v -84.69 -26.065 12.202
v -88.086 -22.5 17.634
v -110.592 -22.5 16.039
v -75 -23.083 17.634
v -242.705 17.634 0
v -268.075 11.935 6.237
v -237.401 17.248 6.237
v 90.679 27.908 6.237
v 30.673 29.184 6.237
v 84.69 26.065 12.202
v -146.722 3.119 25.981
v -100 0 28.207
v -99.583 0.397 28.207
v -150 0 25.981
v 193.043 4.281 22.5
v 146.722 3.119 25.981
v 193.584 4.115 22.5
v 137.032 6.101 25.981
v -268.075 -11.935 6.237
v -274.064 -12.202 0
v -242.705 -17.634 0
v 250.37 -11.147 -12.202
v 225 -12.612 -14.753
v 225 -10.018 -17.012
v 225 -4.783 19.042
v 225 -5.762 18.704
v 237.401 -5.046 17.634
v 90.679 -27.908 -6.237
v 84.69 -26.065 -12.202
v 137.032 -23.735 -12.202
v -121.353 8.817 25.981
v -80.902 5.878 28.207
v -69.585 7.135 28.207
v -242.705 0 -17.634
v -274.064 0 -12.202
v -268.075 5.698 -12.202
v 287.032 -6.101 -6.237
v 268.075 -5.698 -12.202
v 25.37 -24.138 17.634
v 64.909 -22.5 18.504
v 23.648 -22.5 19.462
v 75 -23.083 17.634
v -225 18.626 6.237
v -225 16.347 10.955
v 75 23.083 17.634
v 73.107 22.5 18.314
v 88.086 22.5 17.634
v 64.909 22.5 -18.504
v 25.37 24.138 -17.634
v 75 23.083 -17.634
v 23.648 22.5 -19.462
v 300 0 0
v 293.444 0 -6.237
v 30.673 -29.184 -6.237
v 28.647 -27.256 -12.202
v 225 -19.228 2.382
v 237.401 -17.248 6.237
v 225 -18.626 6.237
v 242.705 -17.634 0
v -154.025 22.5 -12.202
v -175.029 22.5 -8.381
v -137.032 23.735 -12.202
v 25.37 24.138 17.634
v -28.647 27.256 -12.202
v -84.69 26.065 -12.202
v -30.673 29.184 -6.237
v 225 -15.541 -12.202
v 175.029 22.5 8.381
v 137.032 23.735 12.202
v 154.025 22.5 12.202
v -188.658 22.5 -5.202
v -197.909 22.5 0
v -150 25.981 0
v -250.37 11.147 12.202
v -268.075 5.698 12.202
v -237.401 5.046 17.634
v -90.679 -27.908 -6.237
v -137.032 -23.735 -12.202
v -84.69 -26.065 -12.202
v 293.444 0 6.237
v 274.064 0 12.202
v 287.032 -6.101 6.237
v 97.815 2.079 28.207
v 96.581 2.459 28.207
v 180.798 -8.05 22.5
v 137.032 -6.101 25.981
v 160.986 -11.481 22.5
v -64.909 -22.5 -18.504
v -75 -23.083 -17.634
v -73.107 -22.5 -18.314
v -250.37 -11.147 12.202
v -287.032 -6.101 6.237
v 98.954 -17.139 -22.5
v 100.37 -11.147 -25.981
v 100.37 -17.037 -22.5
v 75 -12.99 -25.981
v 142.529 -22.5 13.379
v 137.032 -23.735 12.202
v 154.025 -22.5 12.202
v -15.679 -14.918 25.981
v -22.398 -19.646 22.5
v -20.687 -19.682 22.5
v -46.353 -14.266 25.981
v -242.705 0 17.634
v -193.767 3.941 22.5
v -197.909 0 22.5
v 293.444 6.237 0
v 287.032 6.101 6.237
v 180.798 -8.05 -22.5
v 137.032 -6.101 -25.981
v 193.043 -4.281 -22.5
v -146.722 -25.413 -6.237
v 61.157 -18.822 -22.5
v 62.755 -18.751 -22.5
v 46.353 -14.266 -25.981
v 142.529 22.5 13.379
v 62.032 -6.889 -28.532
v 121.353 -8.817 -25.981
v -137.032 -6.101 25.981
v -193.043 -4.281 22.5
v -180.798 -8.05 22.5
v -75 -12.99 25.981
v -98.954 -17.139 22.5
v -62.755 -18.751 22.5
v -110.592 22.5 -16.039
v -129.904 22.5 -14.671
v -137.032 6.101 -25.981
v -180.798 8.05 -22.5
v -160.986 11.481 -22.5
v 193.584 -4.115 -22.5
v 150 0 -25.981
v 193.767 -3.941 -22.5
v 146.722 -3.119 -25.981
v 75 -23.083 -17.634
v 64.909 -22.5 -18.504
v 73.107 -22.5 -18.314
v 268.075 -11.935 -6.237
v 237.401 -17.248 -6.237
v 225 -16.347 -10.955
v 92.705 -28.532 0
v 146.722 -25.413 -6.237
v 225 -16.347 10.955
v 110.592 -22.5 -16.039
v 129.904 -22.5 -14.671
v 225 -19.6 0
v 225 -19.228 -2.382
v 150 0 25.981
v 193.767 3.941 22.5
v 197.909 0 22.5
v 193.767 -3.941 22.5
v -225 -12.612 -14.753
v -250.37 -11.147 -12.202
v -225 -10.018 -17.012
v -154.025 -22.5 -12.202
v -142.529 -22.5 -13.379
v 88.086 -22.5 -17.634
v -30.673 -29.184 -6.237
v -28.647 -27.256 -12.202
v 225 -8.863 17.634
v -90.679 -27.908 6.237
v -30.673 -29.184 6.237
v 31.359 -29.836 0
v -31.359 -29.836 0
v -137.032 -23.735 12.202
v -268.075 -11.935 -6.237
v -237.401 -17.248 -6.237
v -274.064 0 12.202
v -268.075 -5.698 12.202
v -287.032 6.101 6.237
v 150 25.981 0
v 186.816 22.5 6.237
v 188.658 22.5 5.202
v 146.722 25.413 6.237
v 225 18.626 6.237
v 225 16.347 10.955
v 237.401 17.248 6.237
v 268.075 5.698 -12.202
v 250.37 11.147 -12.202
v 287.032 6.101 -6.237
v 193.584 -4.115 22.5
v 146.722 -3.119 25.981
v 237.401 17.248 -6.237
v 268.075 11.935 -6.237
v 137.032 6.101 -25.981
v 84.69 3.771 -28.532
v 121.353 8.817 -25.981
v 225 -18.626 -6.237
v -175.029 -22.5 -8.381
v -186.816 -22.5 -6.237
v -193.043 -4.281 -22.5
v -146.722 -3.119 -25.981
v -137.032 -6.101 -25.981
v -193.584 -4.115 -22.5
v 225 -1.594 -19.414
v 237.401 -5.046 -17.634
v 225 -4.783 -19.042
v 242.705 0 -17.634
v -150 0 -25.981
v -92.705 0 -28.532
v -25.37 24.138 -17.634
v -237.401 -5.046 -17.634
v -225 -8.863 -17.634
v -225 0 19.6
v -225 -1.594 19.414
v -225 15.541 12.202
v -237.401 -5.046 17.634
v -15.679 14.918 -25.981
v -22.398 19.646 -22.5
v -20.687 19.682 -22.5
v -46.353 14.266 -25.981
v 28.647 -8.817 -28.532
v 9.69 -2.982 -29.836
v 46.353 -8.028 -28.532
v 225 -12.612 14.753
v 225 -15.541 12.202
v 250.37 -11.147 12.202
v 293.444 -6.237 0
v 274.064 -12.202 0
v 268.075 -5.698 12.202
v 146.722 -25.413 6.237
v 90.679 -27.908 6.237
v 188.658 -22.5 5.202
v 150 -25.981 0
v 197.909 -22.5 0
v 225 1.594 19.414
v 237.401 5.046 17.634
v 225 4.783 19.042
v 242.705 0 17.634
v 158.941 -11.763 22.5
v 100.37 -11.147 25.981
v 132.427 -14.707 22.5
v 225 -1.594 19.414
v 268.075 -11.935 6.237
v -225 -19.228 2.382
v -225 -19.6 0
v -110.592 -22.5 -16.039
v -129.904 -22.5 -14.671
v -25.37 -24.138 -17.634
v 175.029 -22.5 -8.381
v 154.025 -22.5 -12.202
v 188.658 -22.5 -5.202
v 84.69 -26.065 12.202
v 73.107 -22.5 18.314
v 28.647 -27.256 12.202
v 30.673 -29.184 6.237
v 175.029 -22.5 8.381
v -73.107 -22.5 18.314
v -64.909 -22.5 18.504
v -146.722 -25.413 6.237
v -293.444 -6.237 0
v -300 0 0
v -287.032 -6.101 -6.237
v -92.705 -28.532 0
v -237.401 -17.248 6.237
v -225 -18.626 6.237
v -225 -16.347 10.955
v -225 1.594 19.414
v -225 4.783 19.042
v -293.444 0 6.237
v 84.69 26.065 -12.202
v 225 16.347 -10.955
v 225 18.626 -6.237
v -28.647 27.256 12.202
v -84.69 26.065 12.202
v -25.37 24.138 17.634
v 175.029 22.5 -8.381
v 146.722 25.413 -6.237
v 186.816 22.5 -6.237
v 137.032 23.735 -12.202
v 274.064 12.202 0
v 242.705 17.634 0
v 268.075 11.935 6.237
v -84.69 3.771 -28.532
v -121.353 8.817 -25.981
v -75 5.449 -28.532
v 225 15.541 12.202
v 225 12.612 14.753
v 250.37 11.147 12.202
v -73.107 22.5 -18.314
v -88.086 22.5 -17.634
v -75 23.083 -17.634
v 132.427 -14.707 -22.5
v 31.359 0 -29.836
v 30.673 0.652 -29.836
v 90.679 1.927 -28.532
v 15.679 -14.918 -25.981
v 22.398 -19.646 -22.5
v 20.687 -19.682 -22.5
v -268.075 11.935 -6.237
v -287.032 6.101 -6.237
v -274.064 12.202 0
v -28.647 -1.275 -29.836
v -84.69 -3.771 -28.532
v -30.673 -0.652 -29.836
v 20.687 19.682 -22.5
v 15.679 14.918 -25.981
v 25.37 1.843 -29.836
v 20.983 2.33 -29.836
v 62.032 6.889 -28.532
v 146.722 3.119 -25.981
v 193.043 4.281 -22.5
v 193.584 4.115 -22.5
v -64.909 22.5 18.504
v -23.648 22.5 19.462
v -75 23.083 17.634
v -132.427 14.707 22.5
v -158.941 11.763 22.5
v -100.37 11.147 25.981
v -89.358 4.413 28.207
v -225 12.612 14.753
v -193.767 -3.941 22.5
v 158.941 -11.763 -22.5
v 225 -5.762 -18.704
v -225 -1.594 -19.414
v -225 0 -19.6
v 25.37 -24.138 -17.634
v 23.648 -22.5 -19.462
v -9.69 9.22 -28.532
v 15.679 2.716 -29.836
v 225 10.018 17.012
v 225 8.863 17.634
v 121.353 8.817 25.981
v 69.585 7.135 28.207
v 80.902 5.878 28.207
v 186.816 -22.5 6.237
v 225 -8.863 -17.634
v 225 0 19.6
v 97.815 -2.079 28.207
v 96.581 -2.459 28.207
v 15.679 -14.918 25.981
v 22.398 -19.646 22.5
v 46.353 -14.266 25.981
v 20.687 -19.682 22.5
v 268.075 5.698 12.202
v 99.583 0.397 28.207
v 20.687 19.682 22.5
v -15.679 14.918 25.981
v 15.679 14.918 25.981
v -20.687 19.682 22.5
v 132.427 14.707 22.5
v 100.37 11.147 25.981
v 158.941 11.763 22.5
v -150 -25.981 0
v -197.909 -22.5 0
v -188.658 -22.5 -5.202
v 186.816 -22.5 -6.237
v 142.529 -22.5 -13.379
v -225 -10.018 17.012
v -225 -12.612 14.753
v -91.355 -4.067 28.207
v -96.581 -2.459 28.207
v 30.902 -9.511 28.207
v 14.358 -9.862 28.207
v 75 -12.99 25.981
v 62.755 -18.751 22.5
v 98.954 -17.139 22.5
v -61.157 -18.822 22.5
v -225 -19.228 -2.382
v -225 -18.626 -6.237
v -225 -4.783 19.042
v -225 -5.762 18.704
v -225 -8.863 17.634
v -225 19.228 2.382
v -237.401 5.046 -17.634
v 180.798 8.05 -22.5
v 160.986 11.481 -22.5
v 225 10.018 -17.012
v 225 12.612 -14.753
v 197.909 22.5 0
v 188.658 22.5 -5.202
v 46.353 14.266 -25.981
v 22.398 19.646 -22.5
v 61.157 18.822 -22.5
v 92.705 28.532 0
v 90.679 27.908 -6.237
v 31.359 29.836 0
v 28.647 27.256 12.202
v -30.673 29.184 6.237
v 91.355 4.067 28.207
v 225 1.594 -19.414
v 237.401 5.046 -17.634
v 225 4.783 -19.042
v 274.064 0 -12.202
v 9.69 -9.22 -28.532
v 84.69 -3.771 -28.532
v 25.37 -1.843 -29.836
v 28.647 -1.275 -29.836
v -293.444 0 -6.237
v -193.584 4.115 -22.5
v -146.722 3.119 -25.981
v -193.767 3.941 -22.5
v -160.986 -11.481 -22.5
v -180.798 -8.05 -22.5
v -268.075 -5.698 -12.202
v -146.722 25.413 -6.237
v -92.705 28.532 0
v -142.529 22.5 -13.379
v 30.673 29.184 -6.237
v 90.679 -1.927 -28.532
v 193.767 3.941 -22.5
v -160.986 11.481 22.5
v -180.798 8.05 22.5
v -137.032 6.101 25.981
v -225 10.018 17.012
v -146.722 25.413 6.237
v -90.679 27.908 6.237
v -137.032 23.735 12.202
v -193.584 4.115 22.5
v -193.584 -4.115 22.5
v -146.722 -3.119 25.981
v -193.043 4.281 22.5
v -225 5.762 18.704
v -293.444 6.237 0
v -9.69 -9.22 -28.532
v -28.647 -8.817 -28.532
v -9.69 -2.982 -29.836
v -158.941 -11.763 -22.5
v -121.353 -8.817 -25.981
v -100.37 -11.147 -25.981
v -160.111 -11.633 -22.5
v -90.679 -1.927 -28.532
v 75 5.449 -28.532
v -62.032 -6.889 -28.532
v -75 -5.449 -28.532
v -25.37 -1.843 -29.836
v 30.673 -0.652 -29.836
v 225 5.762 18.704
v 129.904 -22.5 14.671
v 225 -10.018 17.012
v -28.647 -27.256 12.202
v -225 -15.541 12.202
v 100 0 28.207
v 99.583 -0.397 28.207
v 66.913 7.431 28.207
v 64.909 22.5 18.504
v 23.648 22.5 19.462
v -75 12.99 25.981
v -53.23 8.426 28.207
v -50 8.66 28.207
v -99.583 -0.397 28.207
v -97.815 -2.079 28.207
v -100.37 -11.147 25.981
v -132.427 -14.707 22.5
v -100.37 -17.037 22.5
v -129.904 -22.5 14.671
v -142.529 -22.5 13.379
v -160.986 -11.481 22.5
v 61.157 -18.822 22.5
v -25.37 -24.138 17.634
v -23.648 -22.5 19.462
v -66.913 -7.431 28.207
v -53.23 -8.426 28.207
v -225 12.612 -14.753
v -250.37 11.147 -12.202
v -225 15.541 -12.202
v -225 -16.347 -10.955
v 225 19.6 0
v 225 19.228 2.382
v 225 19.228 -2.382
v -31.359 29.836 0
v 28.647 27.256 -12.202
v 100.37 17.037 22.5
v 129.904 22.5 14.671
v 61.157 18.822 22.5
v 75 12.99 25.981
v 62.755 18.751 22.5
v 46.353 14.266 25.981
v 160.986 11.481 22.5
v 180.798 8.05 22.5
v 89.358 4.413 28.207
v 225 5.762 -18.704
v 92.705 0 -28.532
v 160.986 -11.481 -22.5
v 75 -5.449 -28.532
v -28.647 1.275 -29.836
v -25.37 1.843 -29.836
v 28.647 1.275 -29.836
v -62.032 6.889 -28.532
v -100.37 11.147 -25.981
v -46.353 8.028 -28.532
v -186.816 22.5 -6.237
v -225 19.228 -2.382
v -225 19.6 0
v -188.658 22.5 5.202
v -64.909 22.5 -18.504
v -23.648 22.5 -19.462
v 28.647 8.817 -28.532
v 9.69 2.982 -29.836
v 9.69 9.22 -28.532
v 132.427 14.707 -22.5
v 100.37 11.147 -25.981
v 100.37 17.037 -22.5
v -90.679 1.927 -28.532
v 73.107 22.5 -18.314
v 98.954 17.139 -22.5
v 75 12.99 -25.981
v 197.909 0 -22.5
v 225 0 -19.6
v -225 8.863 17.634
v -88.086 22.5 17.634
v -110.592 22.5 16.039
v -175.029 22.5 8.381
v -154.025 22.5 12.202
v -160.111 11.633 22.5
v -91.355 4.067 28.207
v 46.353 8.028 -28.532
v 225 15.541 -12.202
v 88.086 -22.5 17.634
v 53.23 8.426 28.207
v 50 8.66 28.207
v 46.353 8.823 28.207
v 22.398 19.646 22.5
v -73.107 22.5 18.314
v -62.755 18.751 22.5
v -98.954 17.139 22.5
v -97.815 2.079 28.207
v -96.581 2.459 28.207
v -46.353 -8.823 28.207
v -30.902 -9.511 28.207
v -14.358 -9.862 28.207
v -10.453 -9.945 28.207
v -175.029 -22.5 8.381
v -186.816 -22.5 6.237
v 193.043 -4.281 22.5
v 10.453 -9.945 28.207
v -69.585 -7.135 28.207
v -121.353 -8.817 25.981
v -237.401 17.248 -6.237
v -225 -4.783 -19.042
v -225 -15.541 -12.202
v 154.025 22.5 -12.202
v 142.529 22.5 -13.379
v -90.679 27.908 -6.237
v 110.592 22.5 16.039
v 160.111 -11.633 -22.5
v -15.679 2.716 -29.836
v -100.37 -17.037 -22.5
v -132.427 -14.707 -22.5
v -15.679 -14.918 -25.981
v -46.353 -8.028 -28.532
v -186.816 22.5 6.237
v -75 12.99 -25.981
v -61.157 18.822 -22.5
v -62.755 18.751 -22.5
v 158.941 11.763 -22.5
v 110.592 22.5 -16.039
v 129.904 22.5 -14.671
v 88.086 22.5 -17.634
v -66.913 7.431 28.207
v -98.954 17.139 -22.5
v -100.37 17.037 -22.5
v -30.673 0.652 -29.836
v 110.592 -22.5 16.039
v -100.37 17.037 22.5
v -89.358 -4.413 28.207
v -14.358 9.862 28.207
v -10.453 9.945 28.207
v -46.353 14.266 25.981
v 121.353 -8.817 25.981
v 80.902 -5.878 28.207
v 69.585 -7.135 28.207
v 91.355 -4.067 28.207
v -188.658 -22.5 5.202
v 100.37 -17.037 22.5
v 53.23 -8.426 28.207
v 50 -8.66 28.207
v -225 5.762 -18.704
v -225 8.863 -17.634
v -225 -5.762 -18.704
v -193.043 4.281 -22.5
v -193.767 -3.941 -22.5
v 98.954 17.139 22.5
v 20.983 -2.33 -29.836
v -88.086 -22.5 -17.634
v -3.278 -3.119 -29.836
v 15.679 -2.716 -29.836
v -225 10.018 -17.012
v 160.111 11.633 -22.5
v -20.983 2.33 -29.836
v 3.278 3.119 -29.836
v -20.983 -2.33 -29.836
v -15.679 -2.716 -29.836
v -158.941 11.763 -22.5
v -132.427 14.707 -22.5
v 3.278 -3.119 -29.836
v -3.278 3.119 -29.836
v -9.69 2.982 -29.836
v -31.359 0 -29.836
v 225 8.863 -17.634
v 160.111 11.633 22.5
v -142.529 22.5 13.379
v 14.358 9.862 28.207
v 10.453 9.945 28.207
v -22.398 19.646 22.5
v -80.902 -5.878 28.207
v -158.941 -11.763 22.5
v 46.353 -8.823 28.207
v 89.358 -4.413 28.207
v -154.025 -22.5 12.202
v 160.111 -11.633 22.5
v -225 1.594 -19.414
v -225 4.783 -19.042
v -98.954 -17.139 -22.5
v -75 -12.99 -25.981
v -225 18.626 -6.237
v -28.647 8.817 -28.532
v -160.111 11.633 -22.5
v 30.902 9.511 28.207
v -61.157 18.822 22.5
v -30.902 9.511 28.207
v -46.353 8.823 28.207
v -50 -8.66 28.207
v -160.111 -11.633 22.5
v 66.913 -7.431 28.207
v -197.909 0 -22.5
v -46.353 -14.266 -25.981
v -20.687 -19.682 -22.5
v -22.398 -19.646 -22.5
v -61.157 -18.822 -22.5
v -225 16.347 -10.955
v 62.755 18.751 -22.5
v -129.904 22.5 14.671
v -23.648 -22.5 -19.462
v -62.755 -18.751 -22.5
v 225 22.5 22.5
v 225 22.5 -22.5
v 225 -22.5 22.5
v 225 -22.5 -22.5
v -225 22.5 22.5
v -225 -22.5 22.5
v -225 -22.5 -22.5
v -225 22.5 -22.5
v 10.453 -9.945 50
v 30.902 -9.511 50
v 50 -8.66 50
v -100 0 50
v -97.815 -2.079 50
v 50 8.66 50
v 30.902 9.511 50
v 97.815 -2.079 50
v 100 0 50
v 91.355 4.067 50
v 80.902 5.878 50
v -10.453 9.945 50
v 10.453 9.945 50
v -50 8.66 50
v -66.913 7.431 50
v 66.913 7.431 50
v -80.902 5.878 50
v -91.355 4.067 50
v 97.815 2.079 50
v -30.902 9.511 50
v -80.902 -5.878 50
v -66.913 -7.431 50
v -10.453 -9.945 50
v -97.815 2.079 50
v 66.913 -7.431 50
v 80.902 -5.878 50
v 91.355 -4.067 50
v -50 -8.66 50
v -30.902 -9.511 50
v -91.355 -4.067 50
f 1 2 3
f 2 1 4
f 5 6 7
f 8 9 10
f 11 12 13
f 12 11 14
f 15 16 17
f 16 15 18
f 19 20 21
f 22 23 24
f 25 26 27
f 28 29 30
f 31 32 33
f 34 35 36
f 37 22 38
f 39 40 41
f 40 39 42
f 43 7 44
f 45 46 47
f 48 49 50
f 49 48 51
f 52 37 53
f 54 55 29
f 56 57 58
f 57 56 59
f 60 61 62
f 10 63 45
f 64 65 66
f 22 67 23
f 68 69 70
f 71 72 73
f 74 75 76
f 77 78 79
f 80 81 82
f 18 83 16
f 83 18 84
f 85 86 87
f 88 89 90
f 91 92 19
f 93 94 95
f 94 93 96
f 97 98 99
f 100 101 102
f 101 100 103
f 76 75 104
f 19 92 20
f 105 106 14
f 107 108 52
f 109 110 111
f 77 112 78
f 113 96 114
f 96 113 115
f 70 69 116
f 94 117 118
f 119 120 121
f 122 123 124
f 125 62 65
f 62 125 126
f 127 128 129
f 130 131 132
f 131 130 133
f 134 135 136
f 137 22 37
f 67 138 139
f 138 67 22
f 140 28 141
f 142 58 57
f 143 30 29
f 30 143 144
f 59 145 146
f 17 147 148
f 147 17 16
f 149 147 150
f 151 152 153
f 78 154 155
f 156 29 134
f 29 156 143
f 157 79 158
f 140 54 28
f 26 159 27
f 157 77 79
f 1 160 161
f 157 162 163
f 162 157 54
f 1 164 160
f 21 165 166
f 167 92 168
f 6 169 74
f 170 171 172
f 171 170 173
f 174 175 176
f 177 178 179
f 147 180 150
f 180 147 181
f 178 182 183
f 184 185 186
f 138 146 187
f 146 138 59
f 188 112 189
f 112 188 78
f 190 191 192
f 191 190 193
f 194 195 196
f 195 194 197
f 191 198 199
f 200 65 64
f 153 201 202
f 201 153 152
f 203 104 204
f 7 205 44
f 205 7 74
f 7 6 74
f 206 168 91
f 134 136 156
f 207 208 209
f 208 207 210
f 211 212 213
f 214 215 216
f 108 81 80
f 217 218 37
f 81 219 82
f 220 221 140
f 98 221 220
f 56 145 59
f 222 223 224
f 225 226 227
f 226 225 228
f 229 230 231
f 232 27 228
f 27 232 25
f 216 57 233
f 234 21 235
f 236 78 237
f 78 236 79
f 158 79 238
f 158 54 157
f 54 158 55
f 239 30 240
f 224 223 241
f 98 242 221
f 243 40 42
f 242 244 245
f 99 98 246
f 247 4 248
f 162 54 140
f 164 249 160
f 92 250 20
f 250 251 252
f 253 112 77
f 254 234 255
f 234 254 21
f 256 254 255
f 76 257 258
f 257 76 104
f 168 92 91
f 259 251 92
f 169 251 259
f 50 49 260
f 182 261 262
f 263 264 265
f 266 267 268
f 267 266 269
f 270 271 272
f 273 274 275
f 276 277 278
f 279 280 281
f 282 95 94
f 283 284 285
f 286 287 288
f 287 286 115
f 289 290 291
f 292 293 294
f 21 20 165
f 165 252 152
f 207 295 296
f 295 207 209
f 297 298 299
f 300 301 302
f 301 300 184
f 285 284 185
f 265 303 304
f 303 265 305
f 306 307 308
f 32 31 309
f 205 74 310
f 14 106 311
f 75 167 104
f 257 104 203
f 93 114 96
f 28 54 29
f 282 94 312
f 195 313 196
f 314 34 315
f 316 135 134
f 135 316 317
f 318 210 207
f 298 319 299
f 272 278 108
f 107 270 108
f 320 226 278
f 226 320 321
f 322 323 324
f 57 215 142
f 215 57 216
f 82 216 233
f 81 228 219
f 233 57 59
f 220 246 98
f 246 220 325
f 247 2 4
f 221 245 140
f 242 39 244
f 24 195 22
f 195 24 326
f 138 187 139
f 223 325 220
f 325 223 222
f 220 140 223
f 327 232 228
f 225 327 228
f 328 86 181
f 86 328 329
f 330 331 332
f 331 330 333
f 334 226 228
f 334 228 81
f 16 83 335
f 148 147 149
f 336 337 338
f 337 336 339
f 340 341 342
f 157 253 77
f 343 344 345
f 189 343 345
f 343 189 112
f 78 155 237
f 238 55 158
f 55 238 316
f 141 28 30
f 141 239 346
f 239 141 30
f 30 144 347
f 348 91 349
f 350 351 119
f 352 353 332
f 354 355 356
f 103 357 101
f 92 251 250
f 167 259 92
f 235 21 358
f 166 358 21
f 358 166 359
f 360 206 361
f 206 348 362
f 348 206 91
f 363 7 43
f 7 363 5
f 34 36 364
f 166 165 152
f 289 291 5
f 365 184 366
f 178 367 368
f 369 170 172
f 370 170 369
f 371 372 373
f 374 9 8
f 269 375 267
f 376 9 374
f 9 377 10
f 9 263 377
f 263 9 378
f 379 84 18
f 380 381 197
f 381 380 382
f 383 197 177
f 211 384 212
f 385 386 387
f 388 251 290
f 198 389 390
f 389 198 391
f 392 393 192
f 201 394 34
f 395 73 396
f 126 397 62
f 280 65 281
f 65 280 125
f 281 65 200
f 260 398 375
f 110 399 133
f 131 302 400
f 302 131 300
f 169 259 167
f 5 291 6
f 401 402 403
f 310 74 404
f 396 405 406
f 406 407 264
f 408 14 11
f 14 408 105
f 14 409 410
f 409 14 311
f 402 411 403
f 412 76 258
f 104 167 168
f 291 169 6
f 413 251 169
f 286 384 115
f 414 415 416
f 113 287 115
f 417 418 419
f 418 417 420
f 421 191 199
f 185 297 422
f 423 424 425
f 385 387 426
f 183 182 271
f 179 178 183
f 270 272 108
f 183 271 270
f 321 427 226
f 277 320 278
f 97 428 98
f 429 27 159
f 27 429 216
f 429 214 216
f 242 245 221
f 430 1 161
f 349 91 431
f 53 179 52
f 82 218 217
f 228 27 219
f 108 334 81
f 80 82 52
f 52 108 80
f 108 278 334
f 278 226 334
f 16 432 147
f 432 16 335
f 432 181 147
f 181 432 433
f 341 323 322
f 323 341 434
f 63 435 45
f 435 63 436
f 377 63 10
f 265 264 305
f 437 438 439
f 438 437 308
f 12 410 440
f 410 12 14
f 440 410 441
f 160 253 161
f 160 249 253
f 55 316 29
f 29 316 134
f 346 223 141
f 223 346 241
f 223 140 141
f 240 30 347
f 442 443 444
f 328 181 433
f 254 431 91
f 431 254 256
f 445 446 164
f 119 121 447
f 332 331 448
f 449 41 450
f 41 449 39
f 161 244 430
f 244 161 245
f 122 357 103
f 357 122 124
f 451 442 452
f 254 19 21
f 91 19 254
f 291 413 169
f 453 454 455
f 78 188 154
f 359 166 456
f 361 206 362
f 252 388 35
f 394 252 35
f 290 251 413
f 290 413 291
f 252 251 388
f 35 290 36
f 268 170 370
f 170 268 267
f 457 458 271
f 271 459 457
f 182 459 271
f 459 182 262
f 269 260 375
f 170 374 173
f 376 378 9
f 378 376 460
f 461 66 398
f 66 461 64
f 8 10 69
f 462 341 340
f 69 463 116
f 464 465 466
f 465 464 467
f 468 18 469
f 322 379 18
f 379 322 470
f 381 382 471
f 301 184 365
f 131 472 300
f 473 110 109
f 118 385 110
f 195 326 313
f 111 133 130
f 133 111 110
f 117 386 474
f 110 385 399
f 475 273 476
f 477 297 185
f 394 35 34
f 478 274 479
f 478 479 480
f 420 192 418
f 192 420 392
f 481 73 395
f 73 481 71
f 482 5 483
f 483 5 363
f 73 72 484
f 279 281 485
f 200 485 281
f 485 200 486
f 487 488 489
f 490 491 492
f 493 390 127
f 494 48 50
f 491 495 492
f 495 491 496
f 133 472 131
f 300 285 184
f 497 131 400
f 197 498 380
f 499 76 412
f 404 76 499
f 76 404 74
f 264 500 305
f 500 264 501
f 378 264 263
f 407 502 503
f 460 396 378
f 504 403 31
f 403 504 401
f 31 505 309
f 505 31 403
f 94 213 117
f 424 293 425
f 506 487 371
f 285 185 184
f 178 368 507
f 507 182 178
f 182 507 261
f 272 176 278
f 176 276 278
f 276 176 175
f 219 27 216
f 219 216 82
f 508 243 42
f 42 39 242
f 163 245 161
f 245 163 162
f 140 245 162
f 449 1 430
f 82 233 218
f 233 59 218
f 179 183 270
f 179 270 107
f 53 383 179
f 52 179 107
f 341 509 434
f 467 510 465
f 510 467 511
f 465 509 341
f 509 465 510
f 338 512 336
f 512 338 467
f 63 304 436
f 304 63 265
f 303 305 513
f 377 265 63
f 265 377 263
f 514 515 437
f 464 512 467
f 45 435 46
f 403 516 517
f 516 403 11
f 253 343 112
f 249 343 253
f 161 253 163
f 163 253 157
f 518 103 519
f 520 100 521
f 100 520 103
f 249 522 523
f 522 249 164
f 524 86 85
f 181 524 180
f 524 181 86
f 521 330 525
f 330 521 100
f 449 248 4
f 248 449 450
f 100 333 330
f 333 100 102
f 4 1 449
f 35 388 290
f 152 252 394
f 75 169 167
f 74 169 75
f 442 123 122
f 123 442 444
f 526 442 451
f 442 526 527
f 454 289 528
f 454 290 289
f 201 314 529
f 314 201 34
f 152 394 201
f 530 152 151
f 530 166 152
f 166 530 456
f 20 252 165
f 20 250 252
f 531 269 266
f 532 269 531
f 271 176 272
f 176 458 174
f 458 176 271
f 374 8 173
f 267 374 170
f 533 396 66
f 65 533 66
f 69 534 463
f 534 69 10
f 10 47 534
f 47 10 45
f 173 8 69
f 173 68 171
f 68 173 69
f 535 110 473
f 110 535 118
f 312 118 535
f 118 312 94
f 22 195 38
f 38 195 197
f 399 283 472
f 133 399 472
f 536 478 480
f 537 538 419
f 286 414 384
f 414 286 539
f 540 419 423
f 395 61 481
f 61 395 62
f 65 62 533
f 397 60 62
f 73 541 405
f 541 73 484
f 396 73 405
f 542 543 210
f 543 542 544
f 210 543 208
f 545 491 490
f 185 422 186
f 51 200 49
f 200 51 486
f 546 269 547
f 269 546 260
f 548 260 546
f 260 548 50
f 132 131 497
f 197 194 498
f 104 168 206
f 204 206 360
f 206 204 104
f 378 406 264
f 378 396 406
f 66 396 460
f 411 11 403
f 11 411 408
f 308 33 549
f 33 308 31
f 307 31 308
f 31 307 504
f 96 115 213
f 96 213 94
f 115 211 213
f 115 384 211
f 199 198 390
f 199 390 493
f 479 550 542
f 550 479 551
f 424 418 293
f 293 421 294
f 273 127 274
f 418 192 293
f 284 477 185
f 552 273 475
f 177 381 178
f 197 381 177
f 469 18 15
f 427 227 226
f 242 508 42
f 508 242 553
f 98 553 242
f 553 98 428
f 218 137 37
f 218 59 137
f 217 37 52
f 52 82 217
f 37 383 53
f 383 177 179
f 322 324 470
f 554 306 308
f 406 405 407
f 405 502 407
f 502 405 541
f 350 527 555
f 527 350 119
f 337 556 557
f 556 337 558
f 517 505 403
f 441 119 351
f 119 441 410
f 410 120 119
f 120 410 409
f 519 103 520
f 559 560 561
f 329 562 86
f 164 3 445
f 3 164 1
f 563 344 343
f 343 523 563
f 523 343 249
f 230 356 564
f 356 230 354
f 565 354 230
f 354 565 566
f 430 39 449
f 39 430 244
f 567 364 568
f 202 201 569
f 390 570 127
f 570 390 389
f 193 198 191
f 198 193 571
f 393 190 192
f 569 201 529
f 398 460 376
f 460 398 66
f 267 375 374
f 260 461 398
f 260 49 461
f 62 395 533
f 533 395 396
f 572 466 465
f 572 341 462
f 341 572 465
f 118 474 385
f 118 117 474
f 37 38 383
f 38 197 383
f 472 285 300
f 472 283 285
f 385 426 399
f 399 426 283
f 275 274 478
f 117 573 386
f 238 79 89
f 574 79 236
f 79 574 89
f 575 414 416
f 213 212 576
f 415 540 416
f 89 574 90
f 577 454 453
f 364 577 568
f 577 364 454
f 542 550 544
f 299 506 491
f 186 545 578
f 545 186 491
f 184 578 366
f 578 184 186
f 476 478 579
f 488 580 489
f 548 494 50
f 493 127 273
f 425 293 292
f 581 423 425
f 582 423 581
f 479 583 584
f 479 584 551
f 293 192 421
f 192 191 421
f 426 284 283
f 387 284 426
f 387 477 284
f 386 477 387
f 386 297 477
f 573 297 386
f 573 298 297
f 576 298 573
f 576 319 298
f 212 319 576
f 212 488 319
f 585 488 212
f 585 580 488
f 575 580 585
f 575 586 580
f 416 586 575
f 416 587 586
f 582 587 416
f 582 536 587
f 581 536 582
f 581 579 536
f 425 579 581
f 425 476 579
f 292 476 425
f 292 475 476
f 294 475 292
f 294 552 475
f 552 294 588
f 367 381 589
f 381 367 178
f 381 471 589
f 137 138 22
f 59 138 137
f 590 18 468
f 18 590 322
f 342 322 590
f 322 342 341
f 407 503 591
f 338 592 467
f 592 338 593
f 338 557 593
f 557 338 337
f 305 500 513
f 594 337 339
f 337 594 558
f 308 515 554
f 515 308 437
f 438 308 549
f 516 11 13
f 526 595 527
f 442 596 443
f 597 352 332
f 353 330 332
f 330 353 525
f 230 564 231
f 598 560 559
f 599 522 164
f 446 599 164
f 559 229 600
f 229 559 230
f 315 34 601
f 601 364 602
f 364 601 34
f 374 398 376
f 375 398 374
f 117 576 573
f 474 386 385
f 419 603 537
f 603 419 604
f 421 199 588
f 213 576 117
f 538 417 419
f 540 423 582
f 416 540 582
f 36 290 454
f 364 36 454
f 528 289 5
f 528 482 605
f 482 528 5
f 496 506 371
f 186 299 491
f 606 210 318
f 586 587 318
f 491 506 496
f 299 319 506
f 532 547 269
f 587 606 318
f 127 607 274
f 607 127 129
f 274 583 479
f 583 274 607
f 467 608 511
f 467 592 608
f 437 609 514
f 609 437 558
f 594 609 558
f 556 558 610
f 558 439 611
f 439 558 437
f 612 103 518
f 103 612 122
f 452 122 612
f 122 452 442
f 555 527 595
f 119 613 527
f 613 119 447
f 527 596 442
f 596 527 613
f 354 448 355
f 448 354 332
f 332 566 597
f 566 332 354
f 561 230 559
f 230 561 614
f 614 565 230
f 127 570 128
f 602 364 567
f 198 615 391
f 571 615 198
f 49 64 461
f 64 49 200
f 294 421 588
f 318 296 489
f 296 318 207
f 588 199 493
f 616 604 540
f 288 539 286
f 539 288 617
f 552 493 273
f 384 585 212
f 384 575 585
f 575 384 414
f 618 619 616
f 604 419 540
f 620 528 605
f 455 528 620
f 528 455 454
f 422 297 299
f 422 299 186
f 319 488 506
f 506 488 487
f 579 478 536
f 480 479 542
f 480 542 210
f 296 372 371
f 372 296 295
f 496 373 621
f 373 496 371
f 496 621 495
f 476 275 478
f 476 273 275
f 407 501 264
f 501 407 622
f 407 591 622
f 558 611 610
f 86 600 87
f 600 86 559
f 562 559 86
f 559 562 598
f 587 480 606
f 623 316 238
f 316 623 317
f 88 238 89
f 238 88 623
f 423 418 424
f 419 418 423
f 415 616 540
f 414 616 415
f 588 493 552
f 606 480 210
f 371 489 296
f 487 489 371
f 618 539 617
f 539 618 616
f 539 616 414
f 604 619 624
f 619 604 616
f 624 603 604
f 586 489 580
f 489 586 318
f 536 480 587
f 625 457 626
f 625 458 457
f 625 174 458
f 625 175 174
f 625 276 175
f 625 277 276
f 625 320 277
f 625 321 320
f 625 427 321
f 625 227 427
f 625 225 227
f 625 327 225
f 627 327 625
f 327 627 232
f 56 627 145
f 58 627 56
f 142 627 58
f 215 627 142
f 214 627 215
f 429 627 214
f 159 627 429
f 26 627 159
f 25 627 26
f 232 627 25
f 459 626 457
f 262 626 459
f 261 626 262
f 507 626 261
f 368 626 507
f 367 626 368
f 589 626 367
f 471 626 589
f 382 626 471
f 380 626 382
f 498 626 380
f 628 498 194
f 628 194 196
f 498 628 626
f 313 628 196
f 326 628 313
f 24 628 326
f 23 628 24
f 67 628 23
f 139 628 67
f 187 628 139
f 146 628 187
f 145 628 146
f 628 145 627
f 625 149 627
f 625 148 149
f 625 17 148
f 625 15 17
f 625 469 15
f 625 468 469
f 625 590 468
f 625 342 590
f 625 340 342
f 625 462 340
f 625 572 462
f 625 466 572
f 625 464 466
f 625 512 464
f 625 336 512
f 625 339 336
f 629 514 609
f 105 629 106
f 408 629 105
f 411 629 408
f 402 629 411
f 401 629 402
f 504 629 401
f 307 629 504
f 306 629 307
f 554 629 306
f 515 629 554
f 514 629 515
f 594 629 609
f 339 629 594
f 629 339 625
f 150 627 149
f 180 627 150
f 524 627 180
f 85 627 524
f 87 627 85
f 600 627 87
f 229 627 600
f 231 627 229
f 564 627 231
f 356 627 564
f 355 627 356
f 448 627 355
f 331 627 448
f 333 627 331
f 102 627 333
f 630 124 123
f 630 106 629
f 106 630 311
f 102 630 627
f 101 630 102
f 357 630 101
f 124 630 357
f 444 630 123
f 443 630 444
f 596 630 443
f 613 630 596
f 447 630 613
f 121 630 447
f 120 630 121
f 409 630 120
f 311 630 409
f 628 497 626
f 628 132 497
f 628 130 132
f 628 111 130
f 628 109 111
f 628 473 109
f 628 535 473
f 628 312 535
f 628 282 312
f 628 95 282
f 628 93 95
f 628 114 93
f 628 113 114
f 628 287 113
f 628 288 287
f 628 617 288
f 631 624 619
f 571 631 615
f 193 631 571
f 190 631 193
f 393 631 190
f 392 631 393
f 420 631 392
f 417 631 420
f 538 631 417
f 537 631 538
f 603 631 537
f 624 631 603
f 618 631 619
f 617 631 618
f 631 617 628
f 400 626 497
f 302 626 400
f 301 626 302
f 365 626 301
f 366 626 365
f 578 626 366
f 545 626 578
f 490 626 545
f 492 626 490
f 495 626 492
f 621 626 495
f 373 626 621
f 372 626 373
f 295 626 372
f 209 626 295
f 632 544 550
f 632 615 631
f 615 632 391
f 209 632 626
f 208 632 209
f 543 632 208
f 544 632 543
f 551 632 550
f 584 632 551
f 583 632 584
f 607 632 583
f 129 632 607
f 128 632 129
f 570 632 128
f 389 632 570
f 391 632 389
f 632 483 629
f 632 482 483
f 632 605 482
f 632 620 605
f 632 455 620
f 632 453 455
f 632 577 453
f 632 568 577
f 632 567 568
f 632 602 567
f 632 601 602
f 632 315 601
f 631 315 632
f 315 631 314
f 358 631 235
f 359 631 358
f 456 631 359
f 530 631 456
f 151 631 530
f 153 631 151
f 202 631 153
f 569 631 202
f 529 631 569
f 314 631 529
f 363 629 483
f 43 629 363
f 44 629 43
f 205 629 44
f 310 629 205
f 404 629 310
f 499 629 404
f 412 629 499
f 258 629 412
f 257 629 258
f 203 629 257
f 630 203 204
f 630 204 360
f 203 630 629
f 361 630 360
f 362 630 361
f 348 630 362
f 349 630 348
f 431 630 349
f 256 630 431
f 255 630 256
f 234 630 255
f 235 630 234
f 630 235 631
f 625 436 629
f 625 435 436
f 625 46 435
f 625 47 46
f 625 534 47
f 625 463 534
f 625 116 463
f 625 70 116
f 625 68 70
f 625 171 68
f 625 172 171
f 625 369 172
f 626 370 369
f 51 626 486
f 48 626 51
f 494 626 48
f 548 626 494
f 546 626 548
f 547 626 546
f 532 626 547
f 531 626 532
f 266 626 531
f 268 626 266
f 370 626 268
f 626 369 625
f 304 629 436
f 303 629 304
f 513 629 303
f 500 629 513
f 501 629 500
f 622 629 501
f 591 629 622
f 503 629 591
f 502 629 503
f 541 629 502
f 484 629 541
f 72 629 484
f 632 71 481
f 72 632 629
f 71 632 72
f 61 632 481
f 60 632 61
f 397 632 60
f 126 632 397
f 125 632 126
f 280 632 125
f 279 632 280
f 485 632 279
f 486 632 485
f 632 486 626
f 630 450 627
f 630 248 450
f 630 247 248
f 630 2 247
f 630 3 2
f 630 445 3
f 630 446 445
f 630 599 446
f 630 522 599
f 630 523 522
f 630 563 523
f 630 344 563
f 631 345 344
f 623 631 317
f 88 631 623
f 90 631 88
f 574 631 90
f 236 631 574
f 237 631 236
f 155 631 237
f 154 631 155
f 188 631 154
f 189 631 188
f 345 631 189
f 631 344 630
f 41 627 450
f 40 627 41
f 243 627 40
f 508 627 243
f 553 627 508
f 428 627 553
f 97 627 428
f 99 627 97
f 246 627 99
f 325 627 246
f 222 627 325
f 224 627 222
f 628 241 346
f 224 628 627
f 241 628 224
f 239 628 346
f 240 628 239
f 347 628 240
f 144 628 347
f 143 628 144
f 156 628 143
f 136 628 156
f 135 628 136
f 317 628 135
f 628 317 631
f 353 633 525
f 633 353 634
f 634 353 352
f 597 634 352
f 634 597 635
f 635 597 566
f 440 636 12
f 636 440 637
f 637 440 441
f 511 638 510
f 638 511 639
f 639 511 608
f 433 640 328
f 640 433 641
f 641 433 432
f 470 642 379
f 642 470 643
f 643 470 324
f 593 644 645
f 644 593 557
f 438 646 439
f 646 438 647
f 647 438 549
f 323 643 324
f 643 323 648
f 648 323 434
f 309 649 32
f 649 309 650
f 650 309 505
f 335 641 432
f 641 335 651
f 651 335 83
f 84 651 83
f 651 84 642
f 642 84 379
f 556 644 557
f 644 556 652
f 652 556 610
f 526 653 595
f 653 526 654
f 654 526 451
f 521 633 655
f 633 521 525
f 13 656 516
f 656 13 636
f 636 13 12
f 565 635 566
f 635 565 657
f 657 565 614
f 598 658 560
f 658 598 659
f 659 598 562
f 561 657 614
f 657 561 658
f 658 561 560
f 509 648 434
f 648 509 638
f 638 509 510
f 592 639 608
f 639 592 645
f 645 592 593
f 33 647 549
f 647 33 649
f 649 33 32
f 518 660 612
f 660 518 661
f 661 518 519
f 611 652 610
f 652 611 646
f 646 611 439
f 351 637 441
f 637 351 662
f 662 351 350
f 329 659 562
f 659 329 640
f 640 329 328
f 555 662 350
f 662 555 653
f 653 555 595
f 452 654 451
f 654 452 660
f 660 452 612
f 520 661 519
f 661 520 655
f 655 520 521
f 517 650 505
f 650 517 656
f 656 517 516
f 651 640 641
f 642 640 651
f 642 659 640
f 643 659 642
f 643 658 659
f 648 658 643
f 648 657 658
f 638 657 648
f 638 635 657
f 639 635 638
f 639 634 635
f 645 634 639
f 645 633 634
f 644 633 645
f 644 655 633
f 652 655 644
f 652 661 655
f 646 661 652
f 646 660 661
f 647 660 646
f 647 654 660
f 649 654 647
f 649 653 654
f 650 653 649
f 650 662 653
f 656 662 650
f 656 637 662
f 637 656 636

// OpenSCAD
module elongate() {
  for (i = [0 : $children-1])
    scale([10 , 1, 1 ]) child(i);
}
elongate() {sphere(30); cube(45,center=true); cylinder(r=10,h=50);}
